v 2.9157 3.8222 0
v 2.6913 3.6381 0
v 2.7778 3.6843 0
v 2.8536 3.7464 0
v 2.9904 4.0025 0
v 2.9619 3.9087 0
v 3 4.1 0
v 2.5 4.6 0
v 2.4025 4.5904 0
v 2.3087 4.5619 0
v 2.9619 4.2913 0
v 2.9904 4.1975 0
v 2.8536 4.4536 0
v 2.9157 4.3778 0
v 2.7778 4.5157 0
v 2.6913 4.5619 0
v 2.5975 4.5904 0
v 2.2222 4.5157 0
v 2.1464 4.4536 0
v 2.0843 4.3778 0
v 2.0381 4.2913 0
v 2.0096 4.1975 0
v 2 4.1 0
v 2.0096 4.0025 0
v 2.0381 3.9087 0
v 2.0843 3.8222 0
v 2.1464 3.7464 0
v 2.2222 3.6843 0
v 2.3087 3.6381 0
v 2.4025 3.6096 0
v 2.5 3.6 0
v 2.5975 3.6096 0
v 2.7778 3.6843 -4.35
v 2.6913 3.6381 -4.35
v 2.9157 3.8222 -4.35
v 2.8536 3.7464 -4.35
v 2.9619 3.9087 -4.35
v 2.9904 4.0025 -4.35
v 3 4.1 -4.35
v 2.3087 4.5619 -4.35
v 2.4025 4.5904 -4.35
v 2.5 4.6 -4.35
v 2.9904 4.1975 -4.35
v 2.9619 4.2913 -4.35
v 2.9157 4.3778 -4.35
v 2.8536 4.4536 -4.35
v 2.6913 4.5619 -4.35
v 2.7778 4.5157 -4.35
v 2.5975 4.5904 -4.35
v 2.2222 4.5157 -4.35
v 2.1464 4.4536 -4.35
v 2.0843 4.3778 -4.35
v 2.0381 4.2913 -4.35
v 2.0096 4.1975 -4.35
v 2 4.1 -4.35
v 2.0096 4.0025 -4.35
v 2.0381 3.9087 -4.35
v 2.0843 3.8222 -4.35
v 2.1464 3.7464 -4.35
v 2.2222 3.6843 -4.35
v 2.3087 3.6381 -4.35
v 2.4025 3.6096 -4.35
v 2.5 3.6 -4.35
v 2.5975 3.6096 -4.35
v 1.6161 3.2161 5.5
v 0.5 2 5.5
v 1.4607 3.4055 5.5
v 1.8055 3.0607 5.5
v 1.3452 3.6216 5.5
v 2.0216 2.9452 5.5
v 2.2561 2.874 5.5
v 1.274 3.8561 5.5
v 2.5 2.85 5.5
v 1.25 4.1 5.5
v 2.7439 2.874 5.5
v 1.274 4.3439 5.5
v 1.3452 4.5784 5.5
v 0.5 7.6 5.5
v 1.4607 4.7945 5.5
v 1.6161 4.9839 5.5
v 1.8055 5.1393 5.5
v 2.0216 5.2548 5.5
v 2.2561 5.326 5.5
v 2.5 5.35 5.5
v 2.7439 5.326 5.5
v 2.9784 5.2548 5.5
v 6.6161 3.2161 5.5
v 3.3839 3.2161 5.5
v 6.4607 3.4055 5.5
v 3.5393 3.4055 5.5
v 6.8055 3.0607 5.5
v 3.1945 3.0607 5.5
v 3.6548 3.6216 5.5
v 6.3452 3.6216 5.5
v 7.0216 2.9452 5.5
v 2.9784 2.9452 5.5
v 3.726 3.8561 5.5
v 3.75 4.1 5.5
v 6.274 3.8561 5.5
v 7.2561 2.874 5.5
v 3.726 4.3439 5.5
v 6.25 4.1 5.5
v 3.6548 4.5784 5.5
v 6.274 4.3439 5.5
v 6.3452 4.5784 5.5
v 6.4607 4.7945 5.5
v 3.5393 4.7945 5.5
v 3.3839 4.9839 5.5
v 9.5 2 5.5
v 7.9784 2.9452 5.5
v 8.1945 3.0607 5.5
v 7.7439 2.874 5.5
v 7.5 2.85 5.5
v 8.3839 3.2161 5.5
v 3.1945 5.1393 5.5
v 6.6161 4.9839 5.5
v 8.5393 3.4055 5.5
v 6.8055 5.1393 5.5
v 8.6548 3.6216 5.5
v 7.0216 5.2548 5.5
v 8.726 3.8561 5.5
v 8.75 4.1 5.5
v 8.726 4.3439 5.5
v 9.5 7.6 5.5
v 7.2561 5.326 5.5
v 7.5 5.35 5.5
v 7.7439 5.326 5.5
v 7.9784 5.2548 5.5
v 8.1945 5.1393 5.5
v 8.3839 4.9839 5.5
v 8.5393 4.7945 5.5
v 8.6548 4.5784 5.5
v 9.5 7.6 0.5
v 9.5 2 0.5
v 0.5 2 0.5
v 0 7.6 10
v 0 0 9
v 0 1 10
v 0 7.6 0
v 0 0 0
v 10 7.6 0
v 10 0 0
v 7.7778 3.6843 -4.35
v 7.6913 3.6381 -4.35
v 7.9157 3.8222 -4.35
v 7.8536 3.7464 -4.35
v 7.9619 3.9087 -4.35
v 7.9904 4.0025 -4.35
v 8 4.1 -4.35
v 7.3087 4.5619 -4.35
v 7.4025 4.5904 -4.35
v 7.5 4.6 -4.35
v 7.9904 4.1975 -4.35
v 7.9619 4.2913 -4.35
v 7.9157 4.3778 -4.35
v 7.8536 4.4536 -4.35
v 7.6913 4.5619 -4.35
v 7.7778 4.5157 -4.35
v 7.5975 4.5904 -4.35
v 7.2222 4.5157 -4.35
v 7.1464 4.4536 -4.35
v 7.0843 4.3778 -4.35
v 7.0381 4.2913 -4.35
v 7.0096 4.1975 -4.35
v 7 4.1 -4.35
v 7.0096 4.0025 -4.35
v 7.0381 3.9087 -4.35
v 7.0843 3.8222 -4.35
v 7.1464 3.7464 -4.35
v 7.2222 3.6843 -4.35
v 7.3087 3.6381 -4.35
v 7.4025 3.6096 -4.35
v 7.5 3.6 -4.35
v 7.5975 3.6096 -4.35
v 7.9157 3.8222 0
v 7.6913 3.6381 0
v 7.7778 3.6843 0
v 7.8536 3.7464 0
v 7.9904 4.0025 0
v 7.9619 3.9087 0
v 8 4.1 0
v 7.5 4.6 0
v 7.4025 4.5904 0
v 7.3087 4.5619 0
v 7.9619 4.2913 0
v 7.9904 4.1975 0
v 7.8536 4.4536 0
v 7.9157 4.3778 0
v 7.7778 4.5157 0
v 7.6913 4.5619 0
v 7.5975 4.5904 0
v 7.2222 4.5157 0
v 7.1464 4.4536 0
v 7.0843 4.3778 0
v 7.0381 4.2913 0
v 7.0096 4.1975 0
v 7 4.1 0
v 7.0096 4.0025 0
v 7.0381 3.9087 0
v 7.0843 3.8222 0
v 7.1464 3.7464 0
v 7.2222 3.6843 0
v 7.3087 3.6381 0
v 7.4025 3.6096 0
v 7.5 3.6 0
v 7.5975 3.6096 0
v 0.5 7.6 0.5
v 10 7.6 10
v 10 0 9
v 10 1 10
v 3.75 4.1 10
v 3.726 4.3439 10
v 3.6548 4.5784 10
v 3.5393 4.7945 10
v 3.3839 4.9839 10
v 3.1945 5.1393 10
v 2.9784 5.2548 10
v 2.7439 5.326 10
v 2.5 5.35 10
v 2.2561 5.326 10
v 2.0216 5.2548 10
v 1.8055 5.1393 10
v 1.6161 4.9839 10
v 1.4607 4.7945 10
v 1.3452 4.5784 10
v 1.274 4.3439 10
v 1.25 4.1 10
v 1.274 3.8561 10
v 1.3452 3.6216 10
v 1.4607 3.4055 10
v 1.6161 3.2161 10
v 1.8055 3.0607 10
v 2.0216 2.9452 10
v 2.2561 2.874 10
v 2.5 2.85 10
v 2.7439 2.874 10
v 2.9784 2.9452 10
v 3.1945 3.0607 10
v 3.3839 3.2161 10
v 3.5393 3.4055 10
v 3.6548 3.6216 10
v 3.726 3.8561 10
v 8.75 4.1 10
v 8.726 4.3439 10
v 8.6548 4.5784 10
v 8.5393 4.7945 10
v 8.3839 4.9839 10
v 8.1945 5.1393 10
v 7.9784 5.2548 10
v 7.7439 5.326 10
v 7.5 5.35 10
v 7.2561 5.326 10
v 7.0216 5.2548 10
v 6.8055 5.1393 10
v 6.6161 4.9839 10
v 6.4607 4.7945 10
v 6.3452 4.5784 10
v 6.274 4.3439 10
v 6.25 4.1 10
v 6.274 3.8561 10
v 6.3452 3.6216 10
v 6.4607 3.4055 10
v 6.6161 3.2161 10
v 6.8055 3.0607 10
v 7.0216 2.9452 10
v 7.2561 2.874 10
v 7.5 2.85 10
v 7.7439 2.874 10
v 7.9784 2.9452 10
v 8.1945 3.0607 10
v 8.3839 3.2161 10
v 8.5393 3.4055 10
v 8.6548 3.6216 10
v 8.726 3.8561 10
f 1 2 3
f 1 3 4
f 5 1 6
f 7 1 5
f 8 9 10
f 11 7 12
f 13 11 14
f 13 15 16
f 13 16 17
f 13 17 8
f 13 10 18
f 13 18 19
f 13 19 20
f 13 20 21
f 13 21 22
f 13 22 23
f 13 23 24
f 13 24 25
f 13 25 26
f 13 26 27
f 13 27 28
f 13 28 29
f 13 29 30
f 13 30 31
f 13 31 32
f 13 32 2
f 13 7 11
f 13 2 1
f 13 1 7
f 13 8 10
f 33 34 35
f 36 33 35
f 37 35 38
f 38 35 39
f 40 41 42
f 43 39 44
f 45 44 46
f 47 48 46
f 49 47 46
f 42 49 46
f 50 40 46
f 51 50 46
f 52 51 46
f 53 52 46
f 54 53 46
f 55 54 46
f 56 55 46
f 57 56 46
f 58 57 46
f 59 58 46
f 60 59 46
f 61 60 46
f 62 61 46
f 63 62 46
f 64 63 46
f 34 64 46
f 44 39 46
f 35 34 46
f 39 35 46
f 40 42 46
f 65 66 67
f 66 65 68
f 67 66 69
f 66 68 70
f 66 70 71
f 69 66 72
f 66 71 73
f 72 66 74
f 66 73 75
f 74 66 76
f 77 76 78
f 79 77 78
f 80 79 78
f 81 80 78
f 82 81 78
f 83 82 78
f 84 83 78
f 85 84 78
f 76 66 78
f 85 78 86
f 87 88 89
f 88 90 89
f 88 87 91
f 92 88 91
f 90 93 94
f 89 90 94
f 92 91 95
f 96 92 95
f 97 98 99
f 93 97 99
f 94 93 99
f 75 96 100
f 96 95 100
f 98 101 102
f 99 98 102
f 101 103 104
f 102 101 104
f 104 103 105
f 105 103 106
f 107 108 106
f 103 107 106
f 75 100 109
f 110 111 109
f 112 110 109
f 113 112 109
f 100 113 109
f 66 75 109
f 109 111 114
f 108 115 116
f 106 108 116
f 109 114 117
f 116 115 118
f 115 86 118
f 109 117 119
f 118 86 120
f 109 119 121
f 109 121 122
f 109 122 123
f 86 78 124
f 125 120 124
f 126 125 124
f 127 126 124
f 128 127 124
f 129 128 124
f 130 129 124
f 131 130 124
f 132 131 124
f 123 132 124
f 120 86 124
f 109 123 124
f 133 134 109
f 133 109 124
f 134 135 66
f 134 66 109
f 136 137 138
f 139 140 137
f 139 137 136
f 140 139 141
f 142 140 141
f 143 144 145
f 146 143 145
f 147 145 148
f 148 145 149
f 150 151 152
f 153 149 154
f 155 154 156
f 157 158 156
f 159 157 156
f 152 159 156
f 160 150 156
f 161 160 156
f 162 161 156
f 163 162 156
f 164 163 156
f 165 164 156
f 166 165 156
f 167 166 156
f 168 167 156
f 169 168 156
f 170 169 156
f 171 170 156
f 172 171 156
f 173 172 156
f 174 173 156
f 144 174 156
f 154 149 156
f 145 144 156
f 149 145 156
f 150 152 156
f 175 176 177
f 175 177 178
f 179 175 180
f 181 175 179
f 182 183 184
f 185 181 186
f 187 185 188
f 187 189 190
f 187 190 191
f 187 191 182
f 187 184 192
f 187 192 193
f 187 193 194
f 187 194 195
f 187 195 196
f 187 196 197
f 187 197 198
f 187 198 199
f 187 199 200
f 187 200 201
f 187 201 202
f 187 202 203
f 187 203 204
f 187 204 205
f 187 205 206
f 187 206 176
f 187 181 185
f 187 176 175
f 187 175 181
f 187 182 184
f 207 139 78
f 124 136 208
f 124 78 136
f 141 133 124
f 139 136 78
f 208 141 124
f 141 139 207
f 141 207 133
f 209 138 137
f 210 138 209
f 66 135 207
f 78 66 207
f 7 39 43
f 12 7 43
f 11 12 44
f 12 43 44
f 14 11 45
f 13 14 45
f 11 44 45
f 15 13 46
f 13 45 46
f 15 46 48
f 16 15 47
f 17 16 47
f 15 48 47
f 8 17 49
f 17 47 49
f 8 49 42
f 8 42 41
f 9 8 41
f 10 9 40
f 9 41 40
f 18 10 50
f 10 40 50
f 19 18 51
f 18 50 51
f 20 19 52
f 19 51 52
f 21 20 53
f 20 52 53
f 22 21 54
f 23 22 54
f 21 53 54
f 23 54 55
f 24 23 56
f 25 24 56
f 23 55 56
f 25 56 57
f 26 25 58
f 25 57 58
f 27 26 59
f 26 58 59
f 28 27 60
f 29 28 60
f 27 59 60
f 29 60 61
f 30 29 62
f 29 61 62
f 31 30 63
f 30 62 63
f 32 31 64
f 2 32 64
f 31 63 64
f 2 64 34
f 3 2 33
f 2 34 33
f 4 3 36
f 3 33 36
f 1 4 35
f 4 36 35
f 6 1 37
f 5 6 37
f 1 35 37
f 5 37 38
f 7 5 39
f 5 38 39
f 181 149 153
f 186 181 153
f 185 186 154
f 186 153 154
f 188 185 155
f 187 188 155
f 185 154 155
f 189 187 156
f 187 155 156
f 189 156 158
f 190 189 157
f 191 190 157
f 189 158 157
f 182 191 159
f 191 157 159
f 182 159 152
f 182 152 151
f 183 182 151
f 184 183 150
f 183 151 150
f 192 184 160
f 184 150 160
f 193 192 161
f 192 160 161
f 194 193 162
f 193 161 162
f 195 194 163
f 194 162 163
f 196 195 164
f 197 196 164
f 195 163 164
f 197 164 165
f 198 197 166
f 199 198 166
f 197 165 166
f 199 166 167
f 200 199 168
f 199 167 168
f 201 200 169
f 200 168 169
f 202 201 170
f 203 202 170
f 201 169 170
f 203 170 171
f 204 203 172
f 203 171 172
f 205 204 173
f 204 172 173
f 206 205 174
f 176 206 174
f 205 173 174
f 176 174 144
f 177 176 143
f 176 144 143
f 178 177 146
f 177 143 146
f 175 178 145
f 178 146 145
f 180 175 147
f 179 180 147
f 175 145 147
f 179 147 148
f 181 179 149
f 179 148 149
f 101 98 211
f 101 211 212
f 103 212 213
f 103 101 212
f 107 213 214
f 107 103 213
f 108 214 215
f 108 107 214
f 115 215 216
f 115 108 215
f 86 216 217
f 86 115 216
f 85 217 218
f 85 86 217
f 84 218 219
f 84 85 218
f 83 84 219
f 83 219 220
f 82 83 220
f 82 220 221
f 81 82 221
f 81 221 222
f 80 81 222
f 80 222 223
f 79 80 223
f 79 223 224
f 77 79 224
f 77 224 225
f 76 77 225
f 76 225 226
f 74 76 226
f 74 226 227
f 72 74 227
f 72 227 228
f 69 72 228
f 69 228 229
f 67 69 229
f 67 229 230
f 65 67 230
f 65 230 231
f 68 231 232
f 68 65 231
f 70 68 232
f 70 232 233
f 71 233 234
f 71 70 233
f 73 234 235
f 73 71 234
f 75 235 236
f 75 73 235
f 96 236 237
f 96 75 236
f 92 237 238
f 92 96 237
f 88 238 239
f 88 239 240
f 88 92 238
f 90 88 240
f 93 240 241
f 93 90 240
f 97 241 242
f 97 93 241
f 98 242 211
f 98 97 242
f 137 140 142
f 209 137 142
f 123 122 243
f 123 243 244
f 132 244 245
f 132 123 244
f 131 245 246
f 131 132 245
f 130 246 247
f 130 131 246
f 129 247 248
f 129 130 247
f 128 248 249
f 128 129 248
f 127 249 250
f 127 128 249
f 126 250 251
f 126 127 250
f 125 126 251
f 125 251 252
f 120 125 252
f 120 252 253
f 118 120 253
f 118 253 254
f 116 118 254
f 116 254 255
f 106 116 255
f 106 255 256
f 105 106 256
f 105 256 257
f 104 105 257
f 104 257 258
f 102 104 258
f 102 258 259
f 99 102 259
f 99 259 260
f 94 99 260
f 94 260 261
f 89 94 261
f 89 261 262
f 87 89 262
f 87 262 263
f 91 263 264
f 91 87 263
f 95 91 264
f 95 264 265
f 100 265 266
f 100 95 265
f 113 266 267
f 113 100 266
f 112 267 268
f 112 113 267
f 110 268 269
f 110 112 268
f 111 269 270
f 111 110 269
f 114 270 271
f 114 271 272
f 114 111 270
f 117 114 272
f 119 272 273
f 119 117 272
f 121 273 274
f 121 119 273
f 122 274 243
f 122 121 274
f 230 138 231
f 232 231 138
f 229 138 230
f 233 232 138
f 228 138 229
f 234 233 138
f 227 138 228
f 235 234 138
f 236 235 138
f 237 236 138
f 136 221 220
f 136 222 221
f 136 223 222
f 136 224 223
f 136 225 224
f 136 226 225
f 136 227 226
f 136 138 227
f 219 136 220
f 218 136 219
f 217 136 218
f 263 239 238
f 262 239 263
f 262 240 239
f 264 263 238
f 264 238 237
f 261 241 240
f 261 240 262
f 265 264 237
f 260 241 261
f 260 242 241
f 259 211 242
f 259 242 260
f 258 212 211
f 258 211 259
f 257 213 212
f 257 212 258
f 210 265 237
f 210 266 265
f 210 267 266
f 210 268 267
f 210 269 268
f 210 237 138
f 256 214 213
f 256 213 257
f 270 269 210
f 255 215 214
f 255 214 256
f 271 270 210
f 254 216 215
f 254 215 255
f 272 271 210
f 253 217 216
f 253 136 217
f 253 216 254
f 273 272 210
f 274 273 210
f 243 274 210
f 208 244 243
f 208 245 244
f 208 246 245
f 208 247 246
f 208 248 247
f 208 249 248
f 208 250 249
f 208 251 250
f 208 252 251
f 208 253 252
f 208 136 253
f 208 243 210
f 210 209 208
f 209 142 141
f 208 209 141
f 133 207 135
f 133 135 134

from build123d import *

# Parameters (mm, degrees)
CYLINDER_R        = 0.5
CYLINDER_DEPTH    = 4.35
CYLINDER001_R     = 0.5
CYLINDER001_DEPTH = 4.35
BOX001_W          = 9
BOX001_H          = 6
BOX001_DEPTH      = 5
CYLINDER003_R     = 1.25
CYLINDER003_DEPTH = 5
CYLINDER002_R     = 1.25
CYLINDER002_DEPTH = 5
BOX_W             = 10
BOX_H             = 7.6
BOX_DEPTH         = 10
CHAMFER_SIZE      = 1


with BuildPart() as cylinder:
    # Cylinder → Cylinder (new body)
    with BuildSketch(Plane(origin=(2.5, 4.1, -4.35), x_dir=(1, 0, 0), z_dir=(0, 0, 1))):
        Circle(CYLINDER_R)
    extrude(amount=CYLINDER_DEPTH)


with BuildPart() as cylinder001:
    # Cylinder001 → Cylinder001 (new body)
    with BuildSketch(Plane(origin=(7.5, 4.1, -4.35), x_dir=(1, 0, 0), z_dir=(0, 0, 1))):
        Circle(CYLINDER001_R)
    extrude(amount=CYLINDER001_DEPTH)


with BuildPart() as cube001:
    # Box001 → Box001 (new body)
    with BuildSketch(Plane(origin=(0.5, 2, 0.5), x_dir=(1, 0, 0), z_dir=(0, 0, 1))):
        with Locations((4.5, 3)):
            Rectangle(BOX001_W, BOX001_H)
    extrude(amount=BOX001_DEPTH)


with BuildPart() as cylinder003:
    # Cylinder003 → Cylinder003 (new body)
    with BuildSketch(Plane(origin=(7.5, 4.1, 5), x_dir=(1, 0, 0), z_dir=(0, 0, 1))):
        Circle(CYLINDER003_R)
    extrude(amount=CYLINDER003_DEPTH)


with BuildPart() as cylinder002:
    # Cylinder002 → Cylinder002 (new body)
    with BuildSketch(Plane(origin=(2.5, 4.1, 5), x_dir=(1, 0, 0), z_dir=(0, 0, 1))):
        Circle(CYLINDER002_R)
    extrude(amount=CYLINDER002_DEPTH)


with BuildPart() as chamfer_body:
    # Box → Box (new body)
    with BuildSketch(Plane.XY):
        with Locations((5, 3.8)):
            Rectangle(BOX_W, BOX_H)
    extrude(amount=BOX_DEPTH)

    # Cut: cut Cylinder002
    add(cylinder002.part, mode=Mode.SUBTRACT)

    # Cut001: cut Cylinder003
    add(cylinder003.part, mode=Mode.SUBTRACT)

    # Cut002: cut Cube001
    add(cube001.part, mode=Mode.SUBTRACT)

    # Chamfer
    chamfer_edges = [chamfer_body.edges().sort_by_distance(p)[0] for p in [
        (5, 0, 10),
    ]]
    chamfer(chamfer_edges, length=CHAMFER_SIZE)


solid = Compound([cylinder.part, cylinder001.part, chamfer_body.part])
